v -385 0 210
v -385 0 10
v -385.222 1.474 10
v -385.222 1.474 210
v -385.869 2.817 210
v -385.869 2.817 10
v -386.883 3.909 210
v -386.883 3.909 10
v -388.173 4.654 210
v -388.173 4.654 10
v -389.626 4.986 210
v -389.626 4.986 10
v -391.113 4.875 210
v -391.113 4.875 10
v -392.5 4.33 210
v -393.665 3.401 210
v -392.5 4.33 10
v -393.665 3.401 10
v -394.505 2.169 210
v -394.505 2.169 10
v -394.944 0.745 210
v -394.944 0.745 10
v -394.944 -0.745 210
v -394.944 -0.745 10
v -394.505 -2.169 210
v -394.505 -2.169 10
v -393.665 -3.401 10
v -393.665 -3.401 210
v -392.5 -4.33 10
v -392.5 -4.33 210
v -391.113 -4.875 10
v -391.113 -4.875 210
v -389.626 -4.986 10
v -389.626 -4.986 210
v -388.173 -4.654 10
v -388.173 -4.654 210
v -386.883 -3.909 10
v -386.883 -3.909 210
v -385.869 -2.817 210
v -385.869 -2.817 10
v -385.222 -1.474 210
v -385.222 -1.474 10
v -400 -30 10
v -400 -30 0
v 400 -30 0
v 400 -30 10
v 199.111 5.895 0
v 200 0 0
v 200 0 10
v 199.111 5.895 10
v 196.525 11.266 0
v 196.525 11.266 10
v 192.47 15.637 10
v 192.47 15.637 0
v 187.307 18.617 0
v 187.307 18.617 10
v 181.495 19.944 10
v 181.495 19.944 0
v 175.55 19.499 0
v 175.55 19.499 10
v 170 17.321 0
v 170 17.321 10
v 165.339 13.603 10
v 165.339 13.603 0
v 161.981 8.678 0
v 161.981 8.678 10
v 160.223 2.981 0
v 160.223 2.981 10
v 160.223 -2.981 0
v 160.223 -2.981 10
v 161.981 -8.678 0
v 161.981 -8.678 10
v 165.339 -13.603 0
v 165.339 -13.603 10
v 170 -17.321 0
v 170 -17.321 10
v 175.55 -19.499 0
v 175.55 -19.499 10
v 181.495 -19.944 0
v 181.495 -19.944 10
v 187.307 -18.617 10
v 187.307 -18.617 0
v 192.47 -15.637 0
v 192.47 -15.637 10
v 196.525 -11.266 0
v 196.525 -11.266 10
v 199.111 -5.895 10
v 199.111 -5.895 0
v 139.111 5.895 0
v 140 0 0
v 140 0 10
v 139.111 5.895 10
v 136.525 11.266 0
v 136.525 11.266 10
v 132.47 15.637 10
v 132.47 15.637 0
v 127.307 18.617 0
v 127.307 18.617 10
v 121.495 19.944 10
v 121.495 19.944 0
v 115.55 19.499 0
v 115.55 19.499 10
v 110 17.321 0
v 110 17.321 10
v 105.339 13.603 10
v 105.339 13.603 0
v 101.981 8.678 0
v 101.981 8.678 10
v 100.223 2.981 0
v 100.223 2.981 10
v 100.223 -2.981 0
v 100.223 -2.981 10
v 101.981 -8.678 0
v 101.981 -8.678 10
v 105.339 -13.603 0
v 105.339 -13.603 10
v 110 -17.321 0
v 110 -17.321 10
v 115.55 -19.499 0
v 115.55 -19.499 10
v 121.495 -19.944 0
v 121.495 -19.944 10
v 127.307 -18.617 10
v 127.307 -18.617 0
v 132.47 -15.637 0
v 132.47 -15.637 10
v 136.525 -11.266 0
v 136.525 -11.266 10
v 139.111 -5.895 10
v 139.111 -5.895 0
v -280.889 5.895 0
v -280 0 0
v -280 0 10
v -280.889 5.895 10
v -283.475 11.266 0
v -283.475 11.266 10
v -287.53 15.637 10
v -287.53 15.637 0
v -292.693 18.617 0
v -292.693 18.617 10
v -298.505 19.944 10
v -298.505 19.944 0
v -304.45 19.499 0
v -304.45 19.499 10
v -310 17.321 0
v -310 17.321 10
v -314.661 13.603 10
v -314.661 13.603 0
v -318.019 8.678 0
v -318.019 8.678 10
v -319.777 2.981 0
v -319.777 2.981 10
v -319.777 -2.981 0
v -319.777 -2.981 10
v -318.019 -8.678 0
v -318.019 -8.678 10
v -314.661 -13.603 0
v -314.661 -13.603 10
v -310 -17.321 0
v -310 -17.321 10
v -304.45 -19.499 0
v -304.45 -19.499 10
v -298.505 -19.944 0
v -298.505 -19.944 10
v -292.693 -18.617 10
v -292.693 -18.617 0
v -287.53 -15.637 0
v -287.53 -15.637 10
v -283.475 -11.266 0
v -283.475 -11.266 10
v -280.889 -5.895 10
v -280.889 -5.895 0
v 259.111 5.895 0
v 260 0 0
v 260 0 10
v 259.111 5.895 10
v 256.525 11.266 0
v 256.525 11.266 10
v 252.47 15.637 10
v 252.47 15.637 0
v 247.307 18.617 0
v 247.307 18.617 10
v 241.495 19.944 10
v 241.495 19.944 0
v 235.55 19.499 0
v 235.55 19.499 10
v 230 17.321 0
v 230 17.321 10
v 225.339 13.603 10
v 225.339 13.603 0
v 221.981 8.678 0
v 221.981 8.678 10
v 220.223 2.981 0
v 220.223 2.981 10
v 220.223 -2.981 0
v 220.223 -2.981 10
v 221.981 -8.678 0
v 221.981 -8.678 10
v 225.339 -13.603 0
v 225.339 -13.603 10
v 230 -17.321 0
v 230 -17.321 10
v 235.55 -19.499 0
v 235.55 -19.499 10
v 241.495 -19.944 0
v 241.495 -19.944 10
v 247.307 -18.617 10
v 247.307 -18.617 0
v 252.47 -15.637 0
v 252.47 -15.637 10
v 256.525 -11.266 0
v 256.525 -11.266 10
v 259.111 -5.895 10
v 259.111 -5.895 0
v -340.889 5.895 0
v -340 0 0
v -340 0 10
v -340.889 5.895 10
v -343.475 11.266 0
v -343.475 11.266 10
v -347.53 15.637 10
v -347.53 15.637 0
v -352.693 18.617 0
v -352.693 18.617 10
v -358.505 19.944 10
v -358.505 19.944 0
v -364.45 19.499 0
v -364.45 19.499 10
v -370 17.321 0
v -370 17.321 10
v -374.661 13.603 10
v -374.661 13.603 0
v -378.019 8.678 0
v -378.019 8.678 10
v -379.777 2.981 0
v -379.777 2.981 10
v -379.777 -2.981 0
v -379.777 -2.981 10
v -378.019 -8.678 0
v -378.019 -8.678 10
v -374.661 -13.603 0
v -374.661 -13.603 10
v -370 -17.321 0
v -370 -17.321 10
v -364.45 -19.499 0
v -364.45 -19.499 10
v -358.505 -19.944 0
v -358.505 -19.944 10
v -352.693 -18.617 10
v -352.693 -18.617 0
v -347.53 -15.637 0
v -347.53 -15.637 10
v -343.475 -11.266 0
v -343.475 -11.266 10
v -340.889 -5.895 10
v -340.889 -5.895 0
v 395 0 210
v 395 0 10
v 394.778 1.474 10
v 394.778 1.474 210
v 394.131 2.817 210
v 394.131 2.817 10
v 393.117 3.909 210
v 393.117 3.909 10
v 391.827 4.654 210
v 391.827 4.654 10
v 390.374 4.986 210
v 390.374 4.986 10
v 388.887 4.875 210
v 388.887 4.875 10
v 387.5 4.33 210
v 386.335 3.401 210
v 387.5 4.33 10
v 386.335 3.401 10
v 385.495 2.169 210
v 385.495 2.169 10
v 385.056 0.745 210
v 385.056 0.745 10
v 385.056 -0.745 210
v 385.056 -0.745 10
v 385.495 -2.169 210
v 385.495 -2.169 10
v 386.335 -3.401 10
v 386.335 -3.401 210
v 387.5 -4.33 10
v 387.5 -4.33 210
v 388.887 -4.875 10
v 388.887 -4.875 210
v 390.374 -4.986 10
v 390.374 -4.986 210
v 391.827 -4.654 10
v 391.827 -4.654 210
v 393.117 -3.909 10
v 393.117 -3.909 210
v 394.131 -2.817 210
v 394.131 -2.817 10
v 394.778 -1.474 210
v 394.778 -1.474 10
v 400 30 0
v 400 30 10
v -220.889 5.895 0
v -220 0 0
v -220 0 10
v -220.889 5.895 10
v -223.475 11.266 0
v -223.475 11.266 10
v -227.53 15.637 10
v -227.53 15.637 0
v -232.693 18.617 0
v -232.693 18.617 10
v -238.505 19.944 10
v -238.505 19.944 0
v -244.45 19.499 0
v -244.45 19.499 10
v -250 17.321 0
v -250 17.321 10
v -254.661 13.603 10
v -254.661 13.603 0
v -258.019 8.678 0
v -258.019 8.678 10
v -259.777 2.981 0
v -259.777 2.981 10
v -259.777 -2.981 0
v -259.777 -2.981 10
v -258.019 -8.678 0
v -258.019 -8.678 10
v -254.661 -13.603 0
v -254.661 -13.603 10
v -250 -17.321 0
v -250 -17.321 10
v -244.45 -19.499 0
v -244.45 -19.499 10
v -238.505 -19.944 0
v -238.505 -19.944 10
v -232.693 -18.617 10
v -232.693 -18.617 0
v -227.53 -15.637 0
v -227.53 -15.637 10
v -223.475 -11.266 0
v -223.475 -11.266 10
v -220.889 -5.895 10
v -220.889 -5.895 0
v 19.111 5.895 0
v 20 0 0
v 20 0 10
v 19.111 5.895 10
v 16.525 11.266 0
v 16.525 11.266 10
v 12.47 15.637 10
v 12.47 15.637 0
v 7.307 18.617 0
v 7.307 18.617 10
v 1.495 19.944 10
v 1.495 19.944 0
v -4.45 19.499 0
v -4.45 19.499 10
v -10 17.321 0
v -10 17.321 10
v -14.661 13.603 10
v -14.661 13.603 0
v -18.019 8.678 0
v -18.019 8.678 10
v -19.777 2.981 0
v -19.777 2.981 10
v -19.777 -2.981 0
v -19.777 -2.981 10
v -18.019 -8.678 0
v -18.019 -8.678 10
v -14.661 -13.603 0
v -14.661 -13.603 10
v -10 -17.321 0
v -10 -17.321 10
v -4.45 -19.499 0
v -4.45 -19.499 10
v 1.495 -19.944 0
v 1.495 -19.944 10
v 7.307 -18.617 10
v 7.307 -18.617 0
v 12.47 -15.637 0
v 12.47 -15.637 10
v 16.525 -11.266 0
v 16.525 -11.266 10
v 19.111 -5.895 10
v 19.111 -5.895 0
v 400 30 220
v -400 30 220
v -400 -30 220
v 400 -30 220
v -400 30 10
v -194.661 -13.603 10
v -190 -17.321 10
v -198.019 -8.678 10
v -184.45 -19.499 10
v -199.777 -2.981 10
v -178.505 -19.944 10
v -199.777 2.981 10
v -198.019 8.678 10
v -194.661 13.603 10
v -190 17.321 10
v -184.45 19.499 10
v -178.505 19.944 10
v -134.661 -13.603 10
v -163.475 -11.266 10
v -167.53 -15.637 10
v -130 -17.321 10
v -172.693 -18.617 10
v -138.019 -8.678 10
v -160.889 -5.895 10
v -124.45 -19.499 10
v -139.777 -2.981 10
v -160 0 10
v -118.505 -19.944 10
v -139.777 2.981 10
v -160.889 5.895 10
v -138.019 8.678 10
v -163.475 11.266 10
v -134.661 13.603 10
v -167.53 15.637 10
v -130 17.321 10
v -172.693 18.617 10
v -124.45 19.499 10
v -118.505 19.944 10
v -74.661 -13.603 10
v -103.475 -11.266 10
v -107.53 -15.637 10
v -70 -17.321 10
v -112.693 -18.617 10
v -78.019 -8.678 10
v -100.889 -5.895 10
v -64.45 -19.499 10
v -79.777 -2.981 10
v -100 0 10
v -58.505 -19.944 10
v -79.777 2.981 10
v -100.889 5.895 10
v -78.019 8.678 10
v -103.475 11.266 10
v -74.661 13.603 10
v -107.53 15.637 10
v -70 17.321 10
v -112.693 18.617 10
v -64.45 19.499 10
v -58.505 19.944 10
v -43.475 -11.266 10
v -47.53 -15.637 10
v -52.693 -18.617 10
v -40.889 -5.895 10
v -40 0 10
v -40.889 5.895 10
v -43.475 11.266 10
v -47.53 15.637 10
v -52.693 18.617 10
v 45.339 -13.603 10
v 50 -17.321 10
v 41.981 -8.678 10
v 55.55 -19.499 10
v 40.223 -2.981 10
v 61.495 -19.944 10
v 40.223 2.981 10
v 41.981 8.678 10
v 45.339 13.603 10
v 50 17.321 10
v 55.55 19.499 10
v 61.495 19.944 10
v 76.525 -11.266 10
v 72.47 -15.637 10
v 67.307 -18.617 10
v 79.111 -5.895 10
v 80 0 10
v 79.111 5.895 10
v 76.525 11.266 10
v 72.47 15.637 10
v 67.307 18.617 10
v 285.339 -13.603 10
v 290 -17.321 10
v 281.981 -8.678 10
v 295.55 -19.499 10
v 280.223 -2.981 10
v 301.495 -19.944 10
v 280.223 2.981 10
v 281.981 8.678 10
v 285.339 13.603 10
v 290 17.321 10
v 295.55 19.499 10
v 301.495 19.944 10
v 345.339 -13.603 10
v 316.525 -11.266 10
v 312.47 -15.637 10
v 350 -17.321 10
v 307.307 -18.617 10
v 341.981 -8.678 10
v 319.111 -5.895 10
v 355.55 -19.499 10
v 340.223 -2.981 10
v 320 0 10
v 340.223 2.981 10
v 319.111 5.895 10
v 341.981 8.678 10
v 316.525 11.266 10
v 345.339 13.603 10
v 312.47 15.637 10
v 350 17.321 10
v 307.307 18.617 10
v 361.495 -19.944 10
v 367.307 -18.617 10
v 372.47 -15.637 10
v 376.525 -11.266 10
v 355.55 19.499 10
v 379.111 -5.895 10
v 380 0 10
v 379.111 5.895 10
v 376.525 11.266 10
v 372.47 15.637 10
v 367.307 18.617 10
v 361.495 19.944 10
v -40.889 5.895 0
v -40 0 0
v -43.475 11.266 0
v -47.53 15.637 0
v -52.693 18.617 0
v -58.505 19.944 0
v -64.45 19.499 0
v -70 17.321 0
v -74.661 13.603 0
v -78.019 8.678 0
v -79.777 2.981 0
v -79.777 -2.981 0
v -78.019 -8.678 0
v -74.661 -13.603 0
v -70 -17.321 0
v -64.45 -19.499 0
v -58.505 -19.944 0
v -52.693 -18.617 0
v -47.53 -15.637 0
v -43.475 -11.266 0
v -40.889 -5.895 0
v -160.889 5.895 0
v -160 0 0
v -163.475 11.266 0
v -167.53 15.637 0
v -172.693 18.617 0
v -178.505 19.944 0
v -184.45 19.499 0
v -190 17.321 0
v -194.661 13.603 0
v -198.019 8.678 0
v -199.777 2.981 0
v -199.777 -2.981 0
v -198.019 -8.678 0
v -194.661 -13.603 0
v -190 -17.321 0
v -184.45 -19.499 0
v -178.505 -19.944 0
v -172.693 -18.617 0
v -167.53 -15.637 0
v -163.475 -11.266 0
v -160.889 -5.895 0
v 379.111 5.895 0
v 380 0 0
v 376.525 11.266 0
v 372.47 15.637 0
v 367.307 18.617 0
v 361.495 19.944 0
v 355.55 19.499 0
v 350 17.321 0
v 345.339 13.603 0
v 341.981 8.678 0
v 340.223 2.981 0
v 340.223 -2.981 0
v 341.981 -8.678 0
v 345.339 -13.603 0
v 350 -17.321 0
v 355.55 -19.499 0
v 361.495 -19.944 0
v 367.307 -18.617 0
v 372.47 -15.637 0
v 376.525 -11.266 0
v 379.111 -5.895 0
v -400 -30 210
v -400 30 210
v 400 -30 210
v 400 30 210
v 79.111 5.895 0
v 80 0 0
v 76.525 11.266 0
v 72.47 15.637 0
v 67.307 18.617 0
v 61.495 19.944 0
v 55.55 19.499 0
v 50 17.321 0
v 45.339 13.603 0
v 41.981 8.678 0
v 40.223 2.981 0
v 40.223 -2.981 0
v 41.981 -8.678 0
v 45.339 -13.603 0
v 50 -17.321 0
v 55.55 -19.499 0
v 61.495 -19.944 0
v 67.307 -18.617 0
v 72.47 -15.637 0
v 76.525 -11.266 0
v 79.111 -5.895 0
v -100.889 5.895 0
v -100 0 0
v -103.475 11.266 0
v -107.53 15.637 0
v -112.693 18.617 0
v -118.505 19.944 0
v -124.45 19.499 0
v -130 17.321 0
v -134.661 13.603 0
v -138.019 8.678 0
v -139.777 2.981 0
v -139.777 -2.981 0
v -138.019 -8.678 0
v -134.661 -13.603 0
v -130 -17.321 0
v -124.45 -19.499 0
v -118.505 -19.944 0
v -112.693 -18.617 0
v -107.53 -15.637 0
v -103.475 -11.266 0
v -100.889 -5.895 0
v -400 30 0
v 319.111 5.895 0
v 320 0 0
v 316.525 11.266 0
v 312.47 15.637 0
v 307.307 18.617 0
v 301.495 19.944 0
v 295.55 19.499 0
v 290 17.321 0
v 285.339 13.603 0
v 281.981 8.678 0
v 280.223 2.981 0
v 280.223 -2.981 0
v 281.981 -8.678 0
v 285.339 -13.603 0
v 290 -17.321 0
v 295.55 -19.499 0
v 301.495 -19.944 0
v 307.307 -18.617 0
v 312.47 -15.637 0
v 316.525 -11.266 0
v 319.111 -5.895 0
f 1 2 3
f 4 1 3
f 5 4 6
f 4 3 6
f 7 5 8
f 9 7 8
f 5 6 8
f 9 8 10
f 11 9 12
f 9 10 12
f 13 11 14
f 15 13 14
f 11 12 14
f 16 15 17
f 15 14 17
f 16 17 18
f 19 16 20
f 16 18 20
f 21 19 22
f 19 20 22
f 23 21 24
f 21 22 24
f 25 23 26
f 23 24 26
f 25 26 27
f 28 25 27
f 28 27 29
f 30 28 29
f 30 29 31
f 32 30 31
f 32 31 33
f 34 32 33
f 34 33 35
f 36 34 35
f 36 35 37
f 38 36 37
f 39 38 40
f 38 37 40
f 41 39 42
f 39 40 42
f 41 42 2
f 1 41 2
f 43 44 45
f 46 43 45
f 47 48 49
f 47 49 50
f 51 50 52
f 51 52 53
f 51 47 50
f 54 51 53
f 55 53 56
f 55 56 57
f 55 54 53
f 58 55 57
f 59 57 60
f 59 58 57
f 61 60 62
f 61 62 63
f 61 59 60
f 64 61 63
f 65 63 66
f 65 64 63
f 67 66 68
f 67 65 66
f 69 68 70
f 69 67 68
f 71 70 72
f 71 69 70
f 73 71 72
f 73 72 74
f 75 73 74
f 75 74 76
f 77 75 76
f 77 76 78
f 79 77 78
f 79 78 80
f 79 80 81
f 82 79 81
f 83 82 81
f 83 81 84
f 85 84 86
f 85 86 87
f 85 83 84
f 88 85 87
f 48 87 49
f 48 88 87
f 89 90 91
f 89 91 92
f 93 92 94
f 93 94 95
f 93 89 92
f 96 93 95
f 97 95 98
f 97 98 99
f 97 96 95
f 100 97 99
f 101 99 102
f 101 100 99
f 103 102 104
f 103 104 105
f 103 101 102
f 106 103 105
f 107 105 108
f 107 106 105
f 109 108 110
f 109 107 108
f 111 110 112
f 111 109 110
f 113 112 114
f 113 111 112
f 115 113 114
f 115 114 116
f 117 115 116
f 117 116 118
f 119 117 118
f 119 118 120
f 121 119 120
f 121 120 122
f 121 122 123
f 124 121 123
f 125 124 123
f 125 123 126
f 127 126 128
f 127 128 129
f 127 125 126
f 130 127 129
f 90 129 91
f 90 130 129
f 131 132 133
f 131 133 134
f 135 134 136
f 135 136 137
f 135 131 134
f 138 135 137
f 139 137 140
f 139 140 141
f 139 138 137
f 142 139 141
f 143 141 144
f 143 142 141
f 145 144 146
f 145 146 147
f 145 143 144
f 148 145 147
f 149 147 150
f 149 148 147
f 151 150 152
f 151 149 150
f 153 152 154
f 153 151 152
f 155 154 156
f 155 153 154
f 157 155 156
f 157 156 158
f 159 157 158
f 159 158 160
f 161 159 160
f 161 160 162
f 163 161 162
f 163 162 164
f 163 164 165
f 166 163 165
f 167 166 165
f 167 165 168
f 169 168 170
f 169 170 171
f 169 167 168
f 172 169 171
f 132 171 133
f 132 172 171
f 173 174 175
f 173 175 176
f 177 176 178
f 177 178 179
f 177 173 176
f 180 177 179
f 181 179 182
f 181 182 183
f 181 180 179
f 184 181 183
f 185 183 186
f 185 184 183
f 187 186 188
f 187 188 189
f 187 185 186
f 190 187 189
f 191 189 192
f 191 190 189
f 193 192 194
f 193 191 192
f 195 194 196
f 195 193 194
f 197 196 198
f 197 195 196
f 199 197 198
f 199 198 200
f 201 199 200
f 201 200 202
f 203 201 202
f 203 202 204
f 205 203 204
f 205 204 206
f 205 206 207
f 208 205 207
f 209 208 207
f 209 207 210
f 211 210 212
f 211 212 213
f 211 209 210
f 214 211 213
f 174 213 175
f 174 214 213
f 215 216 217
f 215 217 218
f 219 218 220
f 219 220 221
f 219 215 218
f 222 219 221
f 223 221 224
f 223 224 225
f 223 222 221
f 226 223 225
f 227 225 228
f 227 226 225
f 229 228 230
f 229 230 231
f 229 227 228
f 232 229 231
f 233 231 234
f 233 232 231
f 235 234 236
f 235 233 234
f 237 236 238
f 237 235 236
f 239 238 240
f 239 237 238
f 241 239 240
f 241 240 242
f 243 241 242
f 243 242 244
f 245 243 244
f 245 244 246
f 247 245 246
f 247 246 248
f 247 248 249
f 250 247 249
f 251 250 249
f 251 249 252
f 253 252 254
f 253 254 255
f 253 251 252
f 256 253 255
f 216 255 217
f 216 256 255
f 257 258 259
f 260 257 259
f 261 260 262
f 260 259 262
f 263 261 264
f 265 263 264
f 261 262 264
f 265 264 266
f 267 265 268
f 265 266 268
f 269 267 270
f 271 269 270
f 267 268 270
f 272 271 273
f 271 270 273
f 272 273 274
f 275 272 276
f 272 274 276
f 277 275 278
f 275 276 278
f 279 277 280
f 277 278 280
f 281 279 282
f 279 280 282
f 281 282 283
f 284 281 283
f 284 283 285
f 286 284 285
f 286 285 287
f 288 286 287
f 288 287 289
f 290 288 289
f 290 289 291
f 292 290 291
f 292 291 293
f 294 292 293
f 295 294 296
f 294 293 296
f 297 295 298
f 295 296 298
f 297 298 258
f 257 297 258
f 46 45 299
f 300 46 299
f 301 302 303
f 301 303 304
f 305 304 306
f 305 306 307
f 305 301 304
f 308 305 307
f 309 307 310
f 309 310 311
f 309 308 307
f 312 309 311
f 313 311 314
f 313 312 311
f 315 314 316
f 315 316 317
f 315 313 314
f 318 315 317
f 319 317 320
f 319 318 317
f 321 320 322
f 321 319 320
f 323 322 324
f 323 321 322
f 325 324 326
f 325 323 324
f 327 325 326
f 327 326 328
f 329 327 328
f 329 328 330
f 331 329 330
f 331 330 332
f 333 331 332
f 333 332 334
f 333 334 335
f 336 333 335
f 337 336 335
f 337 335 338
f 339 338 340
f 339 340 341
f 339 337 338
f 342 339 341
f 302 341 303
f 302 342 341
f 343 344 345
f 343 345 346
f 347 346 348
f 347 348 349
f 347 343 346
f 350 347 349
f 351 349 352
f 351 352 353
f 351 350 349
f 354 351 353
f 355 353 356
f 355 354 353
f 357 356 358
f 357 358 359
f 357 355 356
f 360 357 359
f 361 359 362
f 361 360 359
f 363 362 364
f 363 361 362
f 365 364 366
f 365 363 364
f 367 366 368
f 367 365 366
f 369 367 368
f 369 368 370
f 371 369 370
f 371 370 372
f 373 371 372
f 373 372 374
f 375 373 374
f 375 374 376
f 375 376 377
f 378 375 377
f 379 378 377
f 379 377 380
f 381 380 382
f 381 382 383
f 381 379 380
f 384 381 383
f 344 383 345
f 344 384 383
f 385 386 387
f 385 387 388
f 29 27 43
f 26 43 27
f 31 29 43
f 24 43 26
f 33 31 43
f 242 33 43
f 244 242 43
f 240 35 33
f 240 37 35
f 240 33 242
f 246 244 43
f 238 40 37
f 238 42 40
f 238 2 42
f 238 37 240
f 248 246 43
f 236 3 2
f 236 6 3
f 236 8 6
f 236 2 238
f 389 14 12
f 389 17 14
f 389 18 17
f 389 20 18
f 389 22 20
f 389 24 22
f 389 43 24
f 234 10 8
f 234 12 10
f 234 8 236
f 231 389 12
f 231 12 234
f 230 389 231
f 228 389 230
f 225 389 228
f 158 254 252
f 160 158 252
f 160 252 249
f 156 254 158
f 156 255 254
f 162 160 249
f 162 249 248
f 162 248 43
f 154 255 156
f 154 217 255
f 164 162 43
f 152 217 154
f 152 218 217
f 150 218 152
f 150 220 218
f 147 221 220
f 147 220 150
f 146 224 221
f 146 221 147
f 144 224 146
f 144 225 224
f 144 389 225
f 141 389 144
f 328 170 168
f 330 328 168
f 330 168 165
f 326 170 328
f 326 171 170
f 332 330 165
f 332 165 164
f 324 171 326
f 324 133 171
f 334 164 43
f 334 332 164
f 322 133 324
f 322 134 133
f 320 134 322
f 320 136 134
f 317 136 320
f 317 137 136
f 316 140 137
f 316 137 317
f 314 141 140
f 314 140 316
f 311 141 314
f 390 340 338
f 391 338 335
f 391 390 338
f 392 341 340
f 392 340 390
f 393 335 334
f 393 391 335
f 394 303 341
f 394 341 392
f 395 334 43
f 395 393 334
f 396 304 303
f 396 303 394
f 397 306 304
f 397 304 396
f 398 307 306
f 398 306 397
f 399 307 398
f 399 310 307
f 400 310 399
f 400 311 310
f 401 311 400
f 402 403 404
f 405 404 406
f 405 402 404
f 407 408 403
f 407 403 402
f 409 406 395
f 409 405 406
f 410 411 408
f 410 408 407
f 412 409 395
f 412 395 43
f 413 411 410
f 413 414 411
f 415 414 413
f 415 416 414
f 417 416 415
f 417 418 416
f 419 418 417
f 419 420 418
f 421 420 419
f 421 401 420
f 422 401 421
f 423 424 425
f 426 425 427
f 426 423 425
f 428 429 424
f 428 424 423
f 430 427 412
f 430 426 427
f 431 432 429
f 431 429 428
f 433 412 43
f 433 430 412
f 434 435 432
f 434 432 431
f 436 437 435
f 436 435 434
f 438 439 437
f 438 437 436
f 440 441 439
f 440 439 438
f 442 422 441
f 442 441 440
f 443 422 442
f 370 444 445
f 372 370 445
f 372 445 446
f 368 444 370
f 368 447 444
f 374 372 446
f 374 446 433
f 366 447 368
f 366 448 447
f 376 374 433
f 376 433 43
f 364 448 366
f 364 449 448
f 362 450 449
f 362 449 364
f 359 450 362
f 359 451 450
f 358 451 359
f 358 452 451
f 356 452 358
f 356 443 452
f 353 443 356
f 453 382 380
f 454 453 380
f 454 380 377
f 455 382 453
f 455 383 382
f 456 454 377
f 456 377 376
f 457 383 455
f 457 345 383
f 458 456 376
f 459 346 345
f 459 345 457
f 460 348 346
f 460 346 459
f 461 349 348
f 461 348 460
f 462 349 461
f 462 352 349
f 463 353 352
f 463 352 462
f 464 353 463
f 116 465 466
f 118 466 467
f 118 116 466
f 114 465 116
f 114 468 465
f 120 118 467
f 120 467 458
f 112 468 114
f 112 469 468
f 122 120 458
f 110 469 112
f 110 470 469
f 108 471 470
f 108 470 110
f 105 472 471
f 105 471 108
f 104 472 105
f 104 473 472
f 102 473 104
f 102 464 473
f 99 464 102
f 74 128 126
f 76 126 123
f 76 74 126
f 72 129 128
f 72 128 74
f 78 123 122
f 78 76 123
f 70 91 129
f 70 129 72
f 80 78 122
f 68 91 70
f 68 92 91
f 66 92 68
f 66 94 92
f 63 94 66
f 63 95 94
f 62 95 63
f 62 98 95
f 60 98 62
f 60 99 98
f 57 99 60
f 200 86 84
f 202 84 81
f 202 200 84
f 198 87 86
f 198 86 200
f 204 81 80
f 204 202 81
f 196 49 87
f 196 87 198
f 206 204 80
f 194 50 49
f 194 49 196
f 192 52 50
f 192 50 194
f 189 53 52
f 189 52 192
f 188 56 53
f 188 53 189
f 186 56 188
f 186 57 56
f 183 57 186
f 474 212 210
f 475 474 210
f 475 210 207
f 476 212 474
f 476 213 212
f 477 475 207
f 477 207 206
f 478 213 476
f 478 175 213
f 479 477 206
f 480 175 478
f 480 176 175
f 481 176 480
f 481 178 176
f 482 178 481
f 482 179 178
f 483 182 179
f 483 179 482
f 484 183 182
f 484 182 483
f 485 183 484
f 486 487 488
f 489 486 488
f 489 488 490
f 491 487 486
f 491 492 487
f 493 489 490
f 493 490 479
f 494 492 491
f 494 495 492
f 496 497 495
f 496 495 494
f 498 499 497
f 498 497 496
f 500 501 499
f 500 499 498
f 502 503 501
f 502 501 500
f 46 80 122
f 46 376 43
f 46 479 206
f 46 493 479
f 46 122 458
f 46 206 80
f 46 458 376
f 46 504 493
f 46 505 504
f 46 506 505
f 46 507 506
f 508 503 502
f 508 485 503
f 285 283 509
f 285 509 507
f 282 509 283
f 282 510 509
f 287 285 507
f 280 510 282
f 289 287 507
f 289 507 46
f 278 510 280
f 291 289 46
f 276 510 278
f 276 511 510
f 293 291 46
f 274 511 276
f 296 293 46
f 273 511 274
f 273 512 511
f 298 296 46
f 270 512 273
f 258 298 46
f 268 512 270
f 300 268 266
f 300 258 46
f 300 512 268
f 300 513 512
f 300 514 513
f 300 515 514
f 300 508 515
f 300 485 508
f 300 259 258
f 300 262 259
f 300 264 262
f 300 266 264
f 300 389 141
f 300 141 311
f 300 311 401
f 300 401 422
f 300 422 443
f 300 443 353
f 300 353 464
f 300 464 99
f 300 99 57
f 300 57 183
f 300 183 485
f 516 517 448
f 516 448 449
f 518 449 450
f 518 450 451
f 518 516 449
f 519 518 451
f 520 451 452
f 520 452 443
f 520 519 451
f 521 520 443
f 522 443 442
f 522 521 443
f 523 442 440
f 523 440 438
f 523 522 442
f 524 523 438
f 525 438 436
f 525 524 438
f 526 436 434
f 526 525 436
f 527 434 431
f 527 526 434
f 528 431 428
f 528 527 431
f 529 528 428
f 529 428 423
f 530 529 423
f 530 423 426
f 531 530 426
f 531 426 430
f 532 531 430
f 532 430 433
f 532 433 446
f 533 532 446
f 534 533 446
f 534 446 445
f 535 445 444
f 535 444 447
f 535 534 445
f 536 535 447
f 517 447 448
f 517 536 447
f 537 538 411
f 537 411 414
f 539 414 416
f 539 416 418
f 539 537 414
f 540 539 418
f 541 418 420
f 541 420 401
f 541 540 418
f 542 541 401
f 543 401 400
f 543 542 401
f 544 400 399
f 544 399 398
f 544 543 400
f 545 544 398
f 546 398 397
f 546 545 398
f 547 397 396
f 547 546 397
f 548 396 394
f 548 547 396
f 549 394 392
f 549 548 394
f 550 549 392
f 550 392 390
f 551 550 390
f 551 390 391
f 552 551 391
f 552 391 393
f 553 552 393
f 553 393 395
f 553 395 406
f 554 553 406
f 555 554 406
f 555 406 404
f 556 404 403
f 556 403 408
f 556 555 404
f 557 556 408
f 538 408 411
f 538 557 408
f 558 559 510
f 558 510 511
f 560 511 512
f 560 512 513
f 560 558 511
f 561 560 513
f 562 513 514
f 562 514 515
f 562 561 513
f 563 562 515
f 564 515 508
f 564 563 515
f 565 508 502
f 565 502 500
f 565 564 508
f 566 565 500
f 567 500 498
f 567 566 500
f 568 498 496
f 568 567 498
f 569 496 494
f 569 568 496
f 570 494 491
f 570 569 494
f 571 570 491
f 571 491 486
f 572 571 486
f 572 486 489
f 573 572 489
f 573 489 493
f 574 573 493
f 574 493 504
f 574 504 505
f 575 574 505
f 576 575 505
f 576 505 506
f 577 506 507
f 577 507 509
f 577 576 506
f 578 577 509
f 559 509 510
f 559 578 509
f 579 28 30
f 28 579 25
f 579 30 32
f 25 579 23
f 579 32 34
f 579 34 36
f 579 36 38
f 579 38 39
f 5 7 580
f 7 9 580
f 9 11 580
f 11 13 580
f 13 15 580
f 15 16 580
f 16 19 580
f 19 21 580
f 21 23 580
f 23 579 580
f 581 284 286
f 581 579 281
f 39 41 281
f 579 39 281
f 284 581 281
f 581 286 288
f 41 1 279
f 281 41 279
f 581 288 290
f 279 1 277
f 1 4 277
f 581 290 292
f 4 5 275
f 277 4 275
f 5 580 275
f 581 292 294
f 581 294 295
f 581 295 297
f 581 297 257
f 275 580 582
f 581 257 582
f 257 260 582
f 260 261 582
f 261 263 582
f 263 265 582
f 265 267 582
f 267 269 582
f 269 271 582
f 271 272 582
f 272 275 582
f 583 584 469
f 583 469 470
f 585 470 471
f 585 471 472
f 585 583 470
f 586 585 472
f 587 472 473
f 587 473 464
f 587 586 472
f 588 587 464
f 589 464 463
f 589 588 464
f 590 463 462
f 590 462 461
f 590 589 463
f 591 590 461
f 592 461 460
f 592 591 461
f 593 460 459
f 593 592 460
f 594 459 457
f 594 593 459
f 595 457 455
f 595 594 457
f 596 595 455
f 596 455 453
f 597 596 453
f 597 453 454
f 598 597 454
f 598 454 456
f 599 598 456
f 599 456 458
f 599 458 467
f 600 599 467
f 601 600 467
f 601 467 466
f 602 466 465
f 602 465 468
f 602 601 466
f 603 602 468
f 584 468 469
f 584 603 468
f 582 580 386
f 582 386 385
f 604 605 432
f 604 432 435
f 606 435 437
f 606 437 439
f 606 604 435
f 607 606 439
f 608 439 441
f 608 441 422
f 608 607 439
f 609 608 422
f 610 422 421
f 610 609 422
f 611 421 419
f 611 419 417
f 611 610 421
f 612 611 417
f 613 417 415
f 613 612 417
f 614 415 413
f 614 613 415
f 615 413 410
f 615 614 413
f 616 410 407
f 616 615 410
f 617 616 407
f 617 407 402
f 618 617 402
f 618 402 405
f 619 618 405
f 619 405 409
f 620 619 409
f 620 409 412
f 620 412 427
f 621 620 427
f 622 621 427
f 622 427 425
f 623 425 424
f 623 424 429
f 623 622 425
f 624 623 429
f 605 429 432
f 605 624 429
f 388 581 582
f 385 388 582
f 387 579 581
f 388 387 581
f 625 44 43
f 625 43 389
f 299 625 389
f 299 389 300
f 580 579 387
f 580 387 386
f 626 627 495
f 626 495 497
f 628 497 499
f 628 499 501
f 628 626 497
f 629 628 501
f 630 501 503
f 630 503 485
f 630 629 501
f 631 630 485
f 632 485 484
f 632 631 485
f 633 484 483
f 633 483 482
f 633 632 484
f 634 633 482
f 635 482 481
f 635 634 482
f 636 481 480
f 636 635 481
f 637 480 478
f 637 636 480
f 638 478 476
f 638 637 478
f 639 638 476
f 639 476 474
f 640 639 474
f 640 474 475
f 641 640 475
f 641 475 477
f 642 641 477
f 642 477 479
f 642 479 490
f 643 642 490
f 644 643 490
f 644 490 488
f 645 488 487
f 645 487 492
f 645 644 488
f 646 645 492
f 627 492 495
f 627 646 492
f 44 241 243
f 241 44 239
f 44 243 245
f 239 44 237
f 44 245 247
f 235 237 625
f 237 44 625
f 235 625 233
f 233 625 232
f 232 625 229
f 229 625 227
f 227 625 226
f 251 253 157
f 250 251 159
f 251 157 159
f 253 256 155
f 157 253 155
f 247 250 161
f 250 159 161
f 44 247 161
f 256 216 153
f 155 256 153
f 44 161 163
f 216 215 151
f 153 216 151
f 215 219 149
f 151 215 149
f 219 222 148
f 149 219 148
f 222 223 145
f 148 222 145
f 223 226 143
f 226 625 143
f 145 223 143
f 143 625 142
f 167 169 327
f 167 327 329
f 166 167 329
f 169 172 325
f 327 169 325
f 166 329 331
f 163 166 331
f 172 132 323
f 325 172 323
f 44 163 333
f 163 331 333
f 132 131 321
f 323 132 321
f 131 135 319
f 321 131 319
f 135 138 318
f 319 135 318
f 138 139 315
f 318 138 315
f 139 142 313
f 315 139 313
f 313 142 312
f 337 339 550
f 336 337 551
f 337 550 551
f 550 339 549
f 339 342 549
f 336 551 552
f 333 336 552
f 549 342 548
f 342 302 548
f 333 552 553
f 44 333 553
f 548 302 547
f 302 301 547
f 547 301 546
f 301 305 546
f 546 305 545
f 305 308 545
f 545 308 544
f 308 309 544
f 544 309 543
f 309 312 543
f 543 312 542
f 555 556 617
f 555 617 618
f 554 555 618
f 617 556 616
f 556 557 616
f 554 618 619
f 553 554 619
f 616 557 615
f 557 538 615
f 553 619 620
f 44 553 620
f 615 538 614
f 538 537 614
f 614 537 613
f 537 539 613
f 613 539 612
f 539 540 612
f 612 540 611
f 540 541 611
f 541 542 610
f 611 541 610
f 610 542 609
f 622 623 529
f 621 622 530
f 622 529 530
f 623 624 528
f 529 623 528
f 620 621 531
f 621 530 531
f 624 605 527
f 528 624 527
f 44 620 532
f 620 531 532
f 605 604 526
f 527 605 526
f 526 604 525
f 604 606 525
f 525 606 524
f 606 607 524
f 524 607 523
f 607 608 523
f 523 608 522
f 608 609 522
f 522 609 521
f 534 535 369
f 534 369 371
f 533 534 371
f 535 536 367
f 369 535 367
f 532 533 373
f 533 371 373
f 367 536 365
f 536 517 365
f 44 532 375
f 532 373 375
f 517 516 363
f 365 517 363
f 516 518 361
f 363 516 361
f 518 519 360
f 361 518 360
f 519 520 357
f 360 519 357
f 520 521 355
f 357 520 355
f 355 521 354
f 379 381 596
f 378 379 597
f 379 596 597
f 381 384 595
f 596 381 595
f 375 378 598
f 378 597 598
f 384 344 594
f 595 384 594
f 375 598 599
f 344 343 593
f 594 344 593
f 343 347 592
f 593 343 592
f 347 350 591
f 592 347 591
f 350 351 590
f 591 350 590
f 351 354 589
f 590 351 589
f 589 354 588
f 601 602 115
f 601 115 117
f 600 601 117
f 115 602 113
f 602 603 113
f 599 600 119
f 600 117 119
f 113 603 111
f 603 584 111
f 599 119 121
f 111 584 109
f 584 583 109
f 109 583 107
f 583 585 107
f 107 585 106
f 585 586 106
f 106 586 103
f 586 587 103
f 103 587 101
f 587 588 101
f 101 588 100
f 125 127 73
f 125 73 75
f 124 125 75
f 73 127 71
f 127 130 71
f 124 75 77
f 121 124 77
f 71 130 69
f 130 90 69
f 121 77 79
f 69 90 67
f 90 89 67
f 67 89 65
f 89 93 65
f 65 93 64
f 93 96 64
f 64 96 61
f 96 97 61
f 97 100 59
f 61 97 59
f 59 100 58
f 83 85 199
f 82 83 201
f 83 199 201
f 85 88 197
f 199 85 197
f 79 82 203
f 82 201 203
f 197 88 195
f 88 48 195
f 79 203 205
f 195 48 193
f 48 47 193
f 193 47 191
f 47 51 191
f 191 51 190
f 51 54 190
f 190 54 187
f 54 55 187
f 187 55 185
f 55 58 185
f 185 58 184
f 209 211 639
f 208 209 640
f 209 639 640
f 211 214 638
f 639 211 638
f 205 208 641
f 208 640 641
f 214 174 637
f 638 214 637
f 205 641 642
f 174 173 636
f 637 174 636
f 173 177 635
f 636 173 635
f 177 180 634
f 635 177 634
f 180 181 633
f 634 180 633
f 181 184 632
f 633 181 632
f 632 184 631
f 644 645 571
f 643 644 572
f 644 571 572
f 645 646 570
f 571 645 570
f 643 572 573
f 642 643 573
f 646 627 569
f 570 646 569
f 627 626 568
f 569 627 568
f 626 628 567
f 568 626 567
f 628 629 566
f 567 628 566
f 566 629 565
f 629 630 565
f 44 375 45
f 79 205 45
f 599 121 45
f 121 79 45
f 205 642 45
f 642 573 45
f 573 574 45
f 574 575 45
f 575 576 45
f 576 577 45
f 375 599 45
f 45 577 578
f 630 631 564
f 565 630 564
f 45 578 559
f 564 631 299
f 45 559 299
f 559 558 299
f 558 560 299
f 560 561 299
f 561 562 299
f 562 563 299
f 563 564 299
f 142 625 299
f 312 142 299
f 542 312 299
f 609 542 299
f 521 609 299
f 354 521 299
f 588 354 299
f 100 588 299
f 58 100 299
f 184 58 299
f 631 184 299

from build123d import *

# Parameters (mm, degrees)
SKETCH1_W                  = 800
SKETCH1_H                  = 60
BOSS_EXTRUDE1_DEPTH        = 10
SKETCH2_R                  = 20
CUT_EXTRUDE6_DEPTH         = 10
LPATTERN1_COUNT            = 7
LPATTERN1_PITCH            = 60
LPATTERN2_COPY_1_SKETCH_R  = 20
LPATTERN2_COPY_1_DEPTH     = 10
LPATTERN2_COPY_2_SKETCH_R  = 20
LPATTERN2_COPY_2_DEPTH     = 10
LPATTERN2_COPY_3_SKETCH_R  = 20
LPATTERN2_COPY_3_DEPTH     = 10
LPATTERN2_COPY_4_SKETCH_R  = 20
LPATTERN2_COPY_4_DEPTH     = 10
LPATTERN2_COPY_5_SKETCH_R  = 20
LPATTERN2_COPY_5_DEPTH     = 10
LPATTERN2_COPY_6_SKETCH_R  = 20
LPATTERN2_COPY_6_DEPTH     = 10
LPATTERN2_COPY_7_SKETCH_R  = 20
LPATTERN2_COPY_7_DEPTH     = 10
LPATTERN2_COPY_8_SKETCH_R  = 20
LPATTERN2_COPY_8_DEPTH     = 10
LPATTERN2_COPY_9_SKETCH_R  = 20
LPATTERN2_COPY_9_DEPTH     = 10
LPATTERN2_COPY_10_SKETCH_R = 20
LPATTERN2_COPY_10_DEPTH    = 10
LPATTERN2_COPY_11_SKETCH_R = 20
LPATTERN2_COPY_11_DEPTH    = 10
LPATTERN2_COPY_12_SKETCH_R = 20
LPATTERN2_COPY_12_DEPTH    = 10
LPATTERN2_COPY_13_SKETCH_R = 20
LPATTERN2_COPY_13_DEPTH    = 10
LPATTERN2_COPY_14_SKETCH_R = 20
LPATTERN2_COPY_14_DEPTH    = 10
LPATTERN2_COPY_15_SKETCH_R = 20
LPATTERN2_COPY_15_DEPTH    = 10
LPATTERN2_COPY_16_SKETCH_R = 20
LPATTERN2_COPY_16_DEPTH    = 10
LPATTERN2_COPY_17_SKETCH_R = 20
LPATTERN2_COPY_17_DEPTH    = 10
LPATTERN2_COPY_18_SKETCH_R = 20
LPATTERN2_COPY_18_DEPTH    = 10
LPATTERN2_COPY_19_SKETCH_R = 20
LPATTERN2_COPY_19_DEPTH    = 10
LPATTERN2_COPY_20_SKETCH_R = 20
LPATTERN2_COPY_20_DEPTH    = 10
LPATTERN2_COPY_21_SKETCH_R = 20
LPATTERN2_COPY_21_DEPTH    = 10
LPATTERN2_COPY_22_SKETCH_R = 20
LPATTERN2_COPY_22_DEPTH    = 10
LPATTERN2_COPY_23_SKETCH_R = 20
LPATTERN2_COPY_23_DEPTH    = 10
LPATTERN2_COPY_24_SKETCH_R = 20
LPATTERN2_COPY_24_DEPTH    = 10
LPATTERN2_COPY_25_SKETCH_R = 20
LPATTERN2_COPY_25_DEPTH    = 10
LPATTERN2_COPY_26_SKETCH_R = 20
LPATTERN2_COPY_26_DEPTH    = 10
LPATTERN2_COPY_27_SKETCH_R = 20
LPATTERN2_COPY_27_DEPTH    = 10
LPATTERN2_COPY_28_SKETCH_R = 20
LPATTERN2_COPY_28_DEPTH    = 10
LPATTERN2_COPY_29_SKETCH_R = 20
LPATTERN2_COPY_29_DEPTH    = 10
LPATTERN2_COPY_30_SKETCH_R = 20
LPATTERN2_COPY_30_DEPTH    = 10
LPATTERN2_COPY_31_SKETCH_R = 20
LPATTERN2_COPY_31_DEPTH    = 10
LPATTERN2_COPY_32_SKETCH_R = 20
LPATTERN2_COPY_32_DEPTH    = 10
LPATTERN2_COPY_33_SKETCH_R = 20
LPATTERN2_COPY_33_DEPTH    = 10
LPATTERN2_COPY_34_SKETCH_R = 20
LPATTERN2_COPY_34_DEPTH    = 10
LPATTERN2_COPY_35_SKETCH_R = 20
LPATTERN2_COPY_35_DEPTH    = 10
LPATTERN2_COPY_36_SKETCH_R = 20
LPATTERN2_COPY_36_DEPTH    = 10
LPATTERN2_COPY_37_SKETCH_R = 20
LPATTERN2_COPY_37_DEPTH    = 10
LPATTERN2_COPY_38_SKETCH_R = 20
LPATTERN2_COPY_38_DEPTH    = 10
LPATTERN2_COPY_39_SKETCH_R = 20
LPATTERN2_COPY_39_DEPTH    = 10
LPATTERN2_COPY_40_SKETCH_R = 20
LPATTERN2_COPY_40_DEPTH    = 10
LPATTERN2_COPY_41_SKETCH_R = 20
LPATTERN2_COPY_41_DEPTH    = 10
LPATTERN2_COPY_42_SKETCH_R = 20
LPATTERN2_COPY_42_DEPTH    = 10
SKETCH3_R                  = 5
BOSS_EXTRUDE2_DEPTH        = 200
SKETCH4_W                  = 800
SKETCH4_H                  = 60
BOSS_EXTRUDE3_DEPTH        = 10


with BuildPart() as part:
    # Sketch1 → Boss-Extrude1 (new body)
    with BuildSketch(Plane.XY):
        Rectangle(SKETCH1_W, SKETCH1_H)
    extrude(amount=BOSS_EXTRUDE1_DEPTH)

    # Sketch2 → Cut-Extrude6 (cut)
    with BuildSketch(Plane.XY):
        Circle(SKETCH2_R)
    cut_extrude6 = extrude(amount=CUT_EXTRUDE6_DEPTH, mode=Mode.SUBTRACT)

    # LPattern1: Cut-Extrude6 ×7
    with Locations(*[(i * LPATTERN1_PITCH, 0, 0) for i in range(1, LPATTERN1_COUNT)]):
        add(cut_extrude6, mode=Mode.SUBTRACT)

    # LPattern2 copy 1 sketch → LPattern2 copy 1 (cut)
    with BuildSketch(Plane.XY):
        Circle(LPATTERN2_COPY_1_SKETCH_R)
    extrude(amount=LPATTERN2_COPY_1_DEPTH, mode=Mode.SUBTRACT)

    # LPattern2 copy 2 sketch → LPattern2 copy 2 (cut)
    with BuildSketch(Plane(origin=(-60, 0, 0), x_dir=(1, 0, 0), z_dir=(0, 0, 1))):
        Circle(LPATTERN2_COPY_2_SKETCH_R)
    extrude(amount=LPATTERN2_COPY_2_DEPTH, mode=Mode.SUBTRACT)

    # LPattern2 copy 3 sketch → LPattern2 copy 3 (cut)
    with BuildSketch(Plane(origin=(-120, 0, 0), x_dir=(1, 0, 0), z_dir=(0, 0, 1))):
        Circle(LPATTERN2_COPY_3_SKETCH_R)
    extrude(amount=LPATTERN2_COPY_3_DEPTH, mode=Mode.SUBTRACT)

    # LPattern2 copy 4 sketch → LPattern2 copy 4 (cut)
    with BuildSketch(Plane(origin=(-180, 0, 0), x_dir=(1, 0, 0), z_dir=(0, 0, 1))):
        Circle(LPATTERN2_COPY_4_SKETCH_R)
    extrude(amount=LPATTERN2_COPY_4_DEPTH, mode=Mode.SUBTRACT)

    # LPattern2 copy 5 sketch → LPattern2 copy 5 (cut)
    with BuildSketch(Plane(origin=(-240, 0, 0), x_dir=(1, 0, 0), z_dir=(0, 0, 1))):
        Circle(LPATTERN2_COPY_5_SKETCH_R)
    extrude(amount=LPATTERN2_COPY_5_DEPTH, mode=Mode.SUBTRACT)

    # LPattern2 copy 6 sketch → LPattern2 copy 6 (cut)
    with BuildSketch(Plane(origin=(-300, 0, 0), x_dir=(1, 0, 0), z_dir=(0, 0, 1))):
        Circle(LPATTERN2_COPY_6_SKETCH_R)
    extrude(amount=LPATTERN2_COPY_6_DEPTH, mode=Mode.SUBTRACT)

    # LPattern2 copy 7 sketch → LPattern2 copy 7 (cut)
    with BuildSketch(Plane(origin=(60, 0, 0), x_dir=(1, 0, 0), z_dir=(0, 0, 1))):
        Circle(LPATTERN2_COPY_7_SKETCH_R)
    extrude(amount=LPATTERN2_COPY_7_DEPTH, mode=Mode.SUBTRACT)

    # LPattern2 copy 8 sketch → LPattern2 copy 8 (cut)
    with BuildSketch(Plane.XY):
        Circle(LPATTERN2_COPY_8_SKETCH_R)
    extrude(amount=LPATTERN2_COPY_8_DEPTH, mode=Mode.SUBTRACT)

    # LPattern2 copy 9 sketch → LPattern2 copy 9 (cut)
    with BuildSketch(Plane(origin=(-60, 0, 0), x_dir=(1, 0, 0), z_dir=(0, 0, 1))):
        Circle(LPATTERN2_COPY_9_SKETCH_R)
    extrude(amount=LPATTERN2_COPY_9_DEPTH, mode=Mode.SUBTRACT)

    # LPattern2 copy 10 sketch → LPattern2 copy 10 (cut)
    with BuildSketch(Plane(origin=(-120, 0, 0), x_dir=(1, 0, 0), z_dir=(0, 0, 1))):
        Circle(LPATTERN2_COPY_10_SKETCH_R)
    extrude(amount=LPATTERN2_COPY_10_DEPTH, mode=Mode.SUBTRACT)

    # LPattern2 copy 11 sketch → LPattern2 copy 11 (cut)
    with BuildSketch(Plane(origin=(-180, 0, 0), x_dir=(1, 0, 0), z_dir=(0, 0, 1))):
        Circle(LPATTERN2_COPY_11_SKETCH_R)
    extrude(amount=LPATTERN2_COPY_11_DEPTH, mode=Mode.SUBTRACT)

    # LPattern2 copy 12 sketch → LPattern2 copy 12 (cut)
    with BuildSketch(Plane(origin=(-240, 0, 0), x_dir=(1, 0, 0), z_dir=(0, 0, 1))):
        Circle(LPATTERN2_COPY_12_SKETCH_R)
    extrude(amount=LPATTERN2_COPY_12_DEPTH, mode=Mode.SUBTRACT)

    # LPattern2 copy 13 sketch → LPattern2 copy 13 (cut)
    with BuildSketch(Plane(origin=(120, 0, 0), x_dir=(1, 0, 0), z_dir=(0, 0, 1))):
        Circle(LPATTERN2_COPY_13_SKETCH_R)
    extrude(amount=LPATTERN2_COPY_13_DEPTH, mode=Mode.SUBTRACT)

    # LPattern2 copy 14 sketch → LPattern2 copy 14 (cut)
    with BuildSketch(Plane(origin=(60, 0, 0), x_dir=(1, 0, 0), z_dir=(0, 0, 1))):
        Circle(LPATTERN2_COPY_14_SKETCH_R)
    extrude(amount=LPATTERN2_COPY_14_DEPTH, mode=Mode.SUBTRACT)

    # LPattern2 copy 15 sketch → LPattern2 copy 15 (cut)
    with BuildSketch(Plane.XY):
        Circle(LPATTERN2_COPY_15_SKETCH_R)
    extrude(amount=LPATTERN2_COPY_15_DEPTH, mode=Mode.SUBTRACT)

    # LPattern2 copy 16 sketch → LPattern2 copy 16 (cut)
    with BuildSketch(Plane(origin=(-60, 0, 0), x_dir=(1, 0, 0), z_dir=(0, 0, 1))):
        Circle(LPATTERN2_COPY_16_SKETCH_R)
    extrude(amount=LPATTERN2_COPY_16_DEPTH, mode=Mode.SUBTRACT)

    # LPattern2 copy 17 sketch → LPattern2 copy 17 (cut)
    with BuildSketch(Plane(origin=(-120, 0, 0), x_dir=(1, 0, 0), z_dir=(0, 0, 1))):
        Circle(LPATTERN2_COPY_17_SKETCH_R)
    extrude(amount=LPATTERN2_COPY_17_DEPTH, mode=Mode.SUBTRACT)

    # LPattern2 copy 18 sketch → LPattern2 copy 18 (cut)
    with BuildSketch(Plane(origin=(-180, 0, 0), x_dir=(1, 0, 0), z_dir=(0, 0, 1))):
        Circle(LPATTERN2_COPY_18_SKETCH_R)
    extrude(amount=LPATTERN2_COPY_18_DEPTH, mode=Mode.SUBTRACT)

    # LPattern2 copy 19 sketch → LPattern2 copy 19 (cut)
    with BuildSketch(Plane(origin=(180, 0, 0), x_dir=(1, 0, 0), z_dir=(0, 0, 1))):
        Circle(LPATTERN2_COPY_19_SKETCH_R)
    extrude(amount=LPATTERN2_COPY_19_DEPTH, mode=Mode.SUBTRACT)

    # LPattern2 copy 20 sketch → LPattern2 copy 20 (cut)
    with BuildSketch(Plane(origin=(120, 0, 0), x_dir=(1, 0, 0), z_dir=(0, 0, 1))):
        Circle(LPATTERN2_COPY_20_SKETCH_R)
    extrude(amount=LPATTERN2_COPY_20_DEPTH, mode=Mode.SUBTRACT)

    # LPattern2 copy 21 sketch → LPattern2 copy 21 (cut)
    with BuildSketch(Plane(origin=(60, 0, 0), x_dir=(1, 0, 0), z_dir=(0, 0, 1))):
        Circle(LPATTERN2_COPY_21_SKETCH_R)
    extrude(amount=LPATTERN2_COPY_21_DEPTH, mode=Mode.SUBTRACT)

    # LPattern2 copy 22 sketch → LPattern2 copy 22 (cut)
    with BuildSketch(Plane.XY):
        Circle(LPATTERN2_COPY_22_SKETCH_R)
    extrude(amount=LPATTERN2_COPY_22_DEPTH, mode=Mode.SUBTRACT)

    # LPattern2 copy 23 sketch → LPattern2 copy 23 (cut)
    with BuildSketch(Plane(origin=(-60, 0, 0), x_dir=(1, 0, 0), z_dir=(0, 0, 1))):
        Circle(LPATTERN2_COPY_23_SKETCH_R)
    extrude(amount=LPATTERN2_COPY_23_DEPTH, mode=Mode.SUBTRACT)

    # LPattern2 copy 24 sketch → LPattern2 copy 24 (cut)
    with BuildSketch(Plane(origin=(-120, 0, 0), x_dir=(1, 0, 0), z_dir=(0, 0, 1))):
        Circle(LPATTERN2_COPY_24_SKETCH_R)
    extrude(amount=LPATTERN2_COPY_24_DEPTH, mode=Mode.SUBTRACT)

    # LPattern2 copy 25 sketch → LPattern2 copy 25 (cut)
    with BuildSketch(Plane(origin=(240, 0, 0), x_dir=(1, 0, 0), z_dir=(0, 0, 1))):
        Circle(LPATTERN2_COPY_25_SKETCH_R)
    extrude(amount=LPATTERN2_COPY_25_DEPTH, mode=Mode.SUBTRACT)

    # LPattern2 copy 26 sketch → LPattern2 copy 26 (cut)
    with BuildSketch(Plane(origin=(180, 0, 0), x_dir=(1, 0, 0), z_dir=(0, 0, 1))):
        Circle(LPATTERN2_COPY_26_SKETCH_R)
    extrude(amount=LPATTERN2_COPY_26_DEPTH, mode=Mode.SUBTRACT)

    # LPattern2 copy 27 sketch → LPattern2 copy 27 (cut)
    with BuildSketch(Plane(origin=(120, 0, 0), x_dir=(1, 0, 0), z_dir=(0, 0, 1))):
        Circle(LPATTERN2_COPY_27_SKETCH_R)
    extrude(amount=LPATTERN2_COPY_27_DEPTH, mode=Mode.SUBTRACT)

    # LPattern2 copy 28 sketch → LPattern2 copy 28 (cut)
    with BuildSketch(Plane(origin=(60, 0, 0), x_dir=(1, 0, 0), z_dir=(0, 0, 1))):
        Circle(LPATTERN2_COPY_28_SKETCH_R)
    extrude(amount=LPATTERN2_COPY_28_DEPTH, mode=Mode.SUBTRACT)

    # LPattern2 copy 29 sketch → LPattern2 copy 29 (cut)
    with BuildSketch(Plane.XY):
        Circle(LPATTERN2_COPY_29_SKETCH_R)
    extrude(amount=LPATTERN2_COPY_29_DEPTH, mode=Mode.SUBTRACT)

    # LPattern2 copy 30 sketch → LPattern2 copy 30 (cut)
    with BuildSketch(Plane(origin=(-60, 0, 0), x_dir=(1, 0, 0), z_dir=(0, 0, 1))):
        Circle(LPATTERN2_COPY_30_SKETCH_R)
    extrude(amount=LPATTERN2_COPY_30_DEPTH, mode=Mode.SUBTRACT)

    # LPattern2 copy 31 sketch → LPattern2 copy 31 (cut)
    with BuildSketch(Plane(origin=(300, 0, 0), x_dir=(1, 0, 0), z_dir=(0, 0, 1))):
        Circle(LPATTERN2_COPY_31_SKETCH_R)
    extrude(amount=LPATTERN2_COPY_31_DEPTH, mode=Mode.SUBTRACT)

    # LPattern2 copy 32 sketch → LPattern2 copy 32 (cut)
    with BuildSketch(Plane(origin=(240, 0, 0), x_dir=(1, 0, 0), z_dir=(0, 0, 1))):
        Circle(LPATTERN2_COPY_32_SKETCH_R)
    extrude(amount=LPATTERN2_COPY_32_DEPTH, mode=Mode.SUBTRACT)

    # LPattern2 copy 33 sketch → LPattern2 copy 33 (cut)
    with BuildSketch(Plane(origin=(180, 0, 0), x_dir=(1, 0, 0), z_dir=(0, 0, 1))):
        Circle(LPATTERN2_COPY_33_SKETCH_R)
    extrude(amount=LPATTERN2_COPY_33_DEPTH, mode=Mode.SUBTRACT)

    # LPattern2 copy 34 sketch → LPattern2 copy 34 (cut)
    with BuildSketch(Plane(origin=(120, 0, 0), x_dir=(1, 0, 0), z_dir=(0, 0, 1))):
        Circle(LPATTERN2_COPY_34_SKETCH_R)
    extrude(amount=LPATTERN2_COPY_34_DEPTH, mode=Mode.SUBTRACT)

    # LPattern2 copy 35 sketch → LPattern2 copy 35 (cut)
    with BuildSketch(Plane(origin=(60, 0, 0), x_dir=(1, 0, 0), z_dir=(0, 0, 1))):
        Circle(LPATTERN2_COPY_35_SKETCH_R)
    extrude(amount=LPATTERN2_COPY_35_DEPTH, mode=Mode.SUBTRACT)

    # LPattern2 copy 36 sketch → LPattern2 copy 36 (cut)
    with BuildSketch(Plane.XY):
        Circle(LPATTERN2_COPY_36_SKETCH_R)
    extrude(amount=LPATTERN2_COPY_36_DEPTH, mode=Mode.SUBTRACT)

    # LPattern2 copy 37 sketch → LPattern2 copy 37 (cut)
    with BuildSketch(Plane(origin=(-60, 0, 0), x_dir=(1, 0, 0), z_dir=(0, 0, 1))):
        Circle(LPATTERN2_COPY_37_SKETCH_R)
    extrude(amount=LPATTERN2_COPY_37_DEPTH, mode=Mode.SUBTRACT)

    # LPattern2 copy 38 sketch → LPattern2 copy 38 (cut)
    with BuildSketch(Plane(origin=(-120, 0, 0), x_dir=(1, 0, 0), z_dir=(0, 0, 1))):
        Circle(LPATTERN2_COPY_38_SKETCH_R)
    extrude(amount=LPATTERN2_COPY_38_DEPTH, mode=Mode.SUBTRACT)

    # LPattern2 copy 39 sketch → LPattern2 copy 39 (cut)
    with BuildSketch(Plane(origin=(-180, 0, 0), x_dir=(1, 0, 0), z_dir=(0, 0, 1))):
        Circle(LPATTERN2_COPY_39_SKETCH_R)
    extrude(amount=LPATTERN2_COPY_39_DEPTH, mode=Mode.SUBTRACT)

    # LPattern2 copy 40 sketch → LPattern2 copy 40 (cut)
    with BuildSketch(Plane(origin=(-240, 0, 0), x_dir=(1, 0, 0), z_dir=(0, 0, 1))):
        Circle(LPATTERN2_COPY_40_SKETCH_R)
    extrude(amount=LPATTERN2_COPY_40_DEPTH, mode=Mode.SUBTRACT)

    # LPattern2 copy 41 sketch → LPattern2 copy 41 (cut)
    with BuildSketch(Plane(origin=(-300, 0, 0), x_dir=(1, 0, 0), z_dir=(0, 0, 1))):
        Circle(LPATTERN2_COPY_41_SKETCH_R)
    extrude(amount=LPATTERN2_COPY_41_DEPTH, mode=Mode.SUBTRACT)

    # LPattern2 copy 42 sketch → LPattern2 copy 42 (cut)
    with BuildSketch(Plane(origin=(-360, 0, 0), x_dir=(1, 0, 0), z_dir=(0, 0, 1))):
        Circle(LPATTERN2_COPY_42_SKETCH_R)
    extrude(amount=LPATTERN2_COPY_42_DEPTH, mode=Mode.SUBTRACT)

    # Sketch3 → Boss-Extrude2 (add)
    with BuildSketch(Plane.XY.offset(10)):
        with Locations((-390, 0)):
            Circle(SKETCH3_R)
        with Locations((390, 0)):
            Circle(SKETCH3_R)
    extrude(amount=BOSS_EXTRUDE2_DEPTH)

    # Sketch4 → Boss-Extrude3 (add)
    with BuildSketch(Plane.XY.offset(210)):
        Rectangle(SKETCH4_W, SKETCH4_H)
    extrude(amount=BOSS_EXTRUDE3_DEPTH)


solid = part.part
